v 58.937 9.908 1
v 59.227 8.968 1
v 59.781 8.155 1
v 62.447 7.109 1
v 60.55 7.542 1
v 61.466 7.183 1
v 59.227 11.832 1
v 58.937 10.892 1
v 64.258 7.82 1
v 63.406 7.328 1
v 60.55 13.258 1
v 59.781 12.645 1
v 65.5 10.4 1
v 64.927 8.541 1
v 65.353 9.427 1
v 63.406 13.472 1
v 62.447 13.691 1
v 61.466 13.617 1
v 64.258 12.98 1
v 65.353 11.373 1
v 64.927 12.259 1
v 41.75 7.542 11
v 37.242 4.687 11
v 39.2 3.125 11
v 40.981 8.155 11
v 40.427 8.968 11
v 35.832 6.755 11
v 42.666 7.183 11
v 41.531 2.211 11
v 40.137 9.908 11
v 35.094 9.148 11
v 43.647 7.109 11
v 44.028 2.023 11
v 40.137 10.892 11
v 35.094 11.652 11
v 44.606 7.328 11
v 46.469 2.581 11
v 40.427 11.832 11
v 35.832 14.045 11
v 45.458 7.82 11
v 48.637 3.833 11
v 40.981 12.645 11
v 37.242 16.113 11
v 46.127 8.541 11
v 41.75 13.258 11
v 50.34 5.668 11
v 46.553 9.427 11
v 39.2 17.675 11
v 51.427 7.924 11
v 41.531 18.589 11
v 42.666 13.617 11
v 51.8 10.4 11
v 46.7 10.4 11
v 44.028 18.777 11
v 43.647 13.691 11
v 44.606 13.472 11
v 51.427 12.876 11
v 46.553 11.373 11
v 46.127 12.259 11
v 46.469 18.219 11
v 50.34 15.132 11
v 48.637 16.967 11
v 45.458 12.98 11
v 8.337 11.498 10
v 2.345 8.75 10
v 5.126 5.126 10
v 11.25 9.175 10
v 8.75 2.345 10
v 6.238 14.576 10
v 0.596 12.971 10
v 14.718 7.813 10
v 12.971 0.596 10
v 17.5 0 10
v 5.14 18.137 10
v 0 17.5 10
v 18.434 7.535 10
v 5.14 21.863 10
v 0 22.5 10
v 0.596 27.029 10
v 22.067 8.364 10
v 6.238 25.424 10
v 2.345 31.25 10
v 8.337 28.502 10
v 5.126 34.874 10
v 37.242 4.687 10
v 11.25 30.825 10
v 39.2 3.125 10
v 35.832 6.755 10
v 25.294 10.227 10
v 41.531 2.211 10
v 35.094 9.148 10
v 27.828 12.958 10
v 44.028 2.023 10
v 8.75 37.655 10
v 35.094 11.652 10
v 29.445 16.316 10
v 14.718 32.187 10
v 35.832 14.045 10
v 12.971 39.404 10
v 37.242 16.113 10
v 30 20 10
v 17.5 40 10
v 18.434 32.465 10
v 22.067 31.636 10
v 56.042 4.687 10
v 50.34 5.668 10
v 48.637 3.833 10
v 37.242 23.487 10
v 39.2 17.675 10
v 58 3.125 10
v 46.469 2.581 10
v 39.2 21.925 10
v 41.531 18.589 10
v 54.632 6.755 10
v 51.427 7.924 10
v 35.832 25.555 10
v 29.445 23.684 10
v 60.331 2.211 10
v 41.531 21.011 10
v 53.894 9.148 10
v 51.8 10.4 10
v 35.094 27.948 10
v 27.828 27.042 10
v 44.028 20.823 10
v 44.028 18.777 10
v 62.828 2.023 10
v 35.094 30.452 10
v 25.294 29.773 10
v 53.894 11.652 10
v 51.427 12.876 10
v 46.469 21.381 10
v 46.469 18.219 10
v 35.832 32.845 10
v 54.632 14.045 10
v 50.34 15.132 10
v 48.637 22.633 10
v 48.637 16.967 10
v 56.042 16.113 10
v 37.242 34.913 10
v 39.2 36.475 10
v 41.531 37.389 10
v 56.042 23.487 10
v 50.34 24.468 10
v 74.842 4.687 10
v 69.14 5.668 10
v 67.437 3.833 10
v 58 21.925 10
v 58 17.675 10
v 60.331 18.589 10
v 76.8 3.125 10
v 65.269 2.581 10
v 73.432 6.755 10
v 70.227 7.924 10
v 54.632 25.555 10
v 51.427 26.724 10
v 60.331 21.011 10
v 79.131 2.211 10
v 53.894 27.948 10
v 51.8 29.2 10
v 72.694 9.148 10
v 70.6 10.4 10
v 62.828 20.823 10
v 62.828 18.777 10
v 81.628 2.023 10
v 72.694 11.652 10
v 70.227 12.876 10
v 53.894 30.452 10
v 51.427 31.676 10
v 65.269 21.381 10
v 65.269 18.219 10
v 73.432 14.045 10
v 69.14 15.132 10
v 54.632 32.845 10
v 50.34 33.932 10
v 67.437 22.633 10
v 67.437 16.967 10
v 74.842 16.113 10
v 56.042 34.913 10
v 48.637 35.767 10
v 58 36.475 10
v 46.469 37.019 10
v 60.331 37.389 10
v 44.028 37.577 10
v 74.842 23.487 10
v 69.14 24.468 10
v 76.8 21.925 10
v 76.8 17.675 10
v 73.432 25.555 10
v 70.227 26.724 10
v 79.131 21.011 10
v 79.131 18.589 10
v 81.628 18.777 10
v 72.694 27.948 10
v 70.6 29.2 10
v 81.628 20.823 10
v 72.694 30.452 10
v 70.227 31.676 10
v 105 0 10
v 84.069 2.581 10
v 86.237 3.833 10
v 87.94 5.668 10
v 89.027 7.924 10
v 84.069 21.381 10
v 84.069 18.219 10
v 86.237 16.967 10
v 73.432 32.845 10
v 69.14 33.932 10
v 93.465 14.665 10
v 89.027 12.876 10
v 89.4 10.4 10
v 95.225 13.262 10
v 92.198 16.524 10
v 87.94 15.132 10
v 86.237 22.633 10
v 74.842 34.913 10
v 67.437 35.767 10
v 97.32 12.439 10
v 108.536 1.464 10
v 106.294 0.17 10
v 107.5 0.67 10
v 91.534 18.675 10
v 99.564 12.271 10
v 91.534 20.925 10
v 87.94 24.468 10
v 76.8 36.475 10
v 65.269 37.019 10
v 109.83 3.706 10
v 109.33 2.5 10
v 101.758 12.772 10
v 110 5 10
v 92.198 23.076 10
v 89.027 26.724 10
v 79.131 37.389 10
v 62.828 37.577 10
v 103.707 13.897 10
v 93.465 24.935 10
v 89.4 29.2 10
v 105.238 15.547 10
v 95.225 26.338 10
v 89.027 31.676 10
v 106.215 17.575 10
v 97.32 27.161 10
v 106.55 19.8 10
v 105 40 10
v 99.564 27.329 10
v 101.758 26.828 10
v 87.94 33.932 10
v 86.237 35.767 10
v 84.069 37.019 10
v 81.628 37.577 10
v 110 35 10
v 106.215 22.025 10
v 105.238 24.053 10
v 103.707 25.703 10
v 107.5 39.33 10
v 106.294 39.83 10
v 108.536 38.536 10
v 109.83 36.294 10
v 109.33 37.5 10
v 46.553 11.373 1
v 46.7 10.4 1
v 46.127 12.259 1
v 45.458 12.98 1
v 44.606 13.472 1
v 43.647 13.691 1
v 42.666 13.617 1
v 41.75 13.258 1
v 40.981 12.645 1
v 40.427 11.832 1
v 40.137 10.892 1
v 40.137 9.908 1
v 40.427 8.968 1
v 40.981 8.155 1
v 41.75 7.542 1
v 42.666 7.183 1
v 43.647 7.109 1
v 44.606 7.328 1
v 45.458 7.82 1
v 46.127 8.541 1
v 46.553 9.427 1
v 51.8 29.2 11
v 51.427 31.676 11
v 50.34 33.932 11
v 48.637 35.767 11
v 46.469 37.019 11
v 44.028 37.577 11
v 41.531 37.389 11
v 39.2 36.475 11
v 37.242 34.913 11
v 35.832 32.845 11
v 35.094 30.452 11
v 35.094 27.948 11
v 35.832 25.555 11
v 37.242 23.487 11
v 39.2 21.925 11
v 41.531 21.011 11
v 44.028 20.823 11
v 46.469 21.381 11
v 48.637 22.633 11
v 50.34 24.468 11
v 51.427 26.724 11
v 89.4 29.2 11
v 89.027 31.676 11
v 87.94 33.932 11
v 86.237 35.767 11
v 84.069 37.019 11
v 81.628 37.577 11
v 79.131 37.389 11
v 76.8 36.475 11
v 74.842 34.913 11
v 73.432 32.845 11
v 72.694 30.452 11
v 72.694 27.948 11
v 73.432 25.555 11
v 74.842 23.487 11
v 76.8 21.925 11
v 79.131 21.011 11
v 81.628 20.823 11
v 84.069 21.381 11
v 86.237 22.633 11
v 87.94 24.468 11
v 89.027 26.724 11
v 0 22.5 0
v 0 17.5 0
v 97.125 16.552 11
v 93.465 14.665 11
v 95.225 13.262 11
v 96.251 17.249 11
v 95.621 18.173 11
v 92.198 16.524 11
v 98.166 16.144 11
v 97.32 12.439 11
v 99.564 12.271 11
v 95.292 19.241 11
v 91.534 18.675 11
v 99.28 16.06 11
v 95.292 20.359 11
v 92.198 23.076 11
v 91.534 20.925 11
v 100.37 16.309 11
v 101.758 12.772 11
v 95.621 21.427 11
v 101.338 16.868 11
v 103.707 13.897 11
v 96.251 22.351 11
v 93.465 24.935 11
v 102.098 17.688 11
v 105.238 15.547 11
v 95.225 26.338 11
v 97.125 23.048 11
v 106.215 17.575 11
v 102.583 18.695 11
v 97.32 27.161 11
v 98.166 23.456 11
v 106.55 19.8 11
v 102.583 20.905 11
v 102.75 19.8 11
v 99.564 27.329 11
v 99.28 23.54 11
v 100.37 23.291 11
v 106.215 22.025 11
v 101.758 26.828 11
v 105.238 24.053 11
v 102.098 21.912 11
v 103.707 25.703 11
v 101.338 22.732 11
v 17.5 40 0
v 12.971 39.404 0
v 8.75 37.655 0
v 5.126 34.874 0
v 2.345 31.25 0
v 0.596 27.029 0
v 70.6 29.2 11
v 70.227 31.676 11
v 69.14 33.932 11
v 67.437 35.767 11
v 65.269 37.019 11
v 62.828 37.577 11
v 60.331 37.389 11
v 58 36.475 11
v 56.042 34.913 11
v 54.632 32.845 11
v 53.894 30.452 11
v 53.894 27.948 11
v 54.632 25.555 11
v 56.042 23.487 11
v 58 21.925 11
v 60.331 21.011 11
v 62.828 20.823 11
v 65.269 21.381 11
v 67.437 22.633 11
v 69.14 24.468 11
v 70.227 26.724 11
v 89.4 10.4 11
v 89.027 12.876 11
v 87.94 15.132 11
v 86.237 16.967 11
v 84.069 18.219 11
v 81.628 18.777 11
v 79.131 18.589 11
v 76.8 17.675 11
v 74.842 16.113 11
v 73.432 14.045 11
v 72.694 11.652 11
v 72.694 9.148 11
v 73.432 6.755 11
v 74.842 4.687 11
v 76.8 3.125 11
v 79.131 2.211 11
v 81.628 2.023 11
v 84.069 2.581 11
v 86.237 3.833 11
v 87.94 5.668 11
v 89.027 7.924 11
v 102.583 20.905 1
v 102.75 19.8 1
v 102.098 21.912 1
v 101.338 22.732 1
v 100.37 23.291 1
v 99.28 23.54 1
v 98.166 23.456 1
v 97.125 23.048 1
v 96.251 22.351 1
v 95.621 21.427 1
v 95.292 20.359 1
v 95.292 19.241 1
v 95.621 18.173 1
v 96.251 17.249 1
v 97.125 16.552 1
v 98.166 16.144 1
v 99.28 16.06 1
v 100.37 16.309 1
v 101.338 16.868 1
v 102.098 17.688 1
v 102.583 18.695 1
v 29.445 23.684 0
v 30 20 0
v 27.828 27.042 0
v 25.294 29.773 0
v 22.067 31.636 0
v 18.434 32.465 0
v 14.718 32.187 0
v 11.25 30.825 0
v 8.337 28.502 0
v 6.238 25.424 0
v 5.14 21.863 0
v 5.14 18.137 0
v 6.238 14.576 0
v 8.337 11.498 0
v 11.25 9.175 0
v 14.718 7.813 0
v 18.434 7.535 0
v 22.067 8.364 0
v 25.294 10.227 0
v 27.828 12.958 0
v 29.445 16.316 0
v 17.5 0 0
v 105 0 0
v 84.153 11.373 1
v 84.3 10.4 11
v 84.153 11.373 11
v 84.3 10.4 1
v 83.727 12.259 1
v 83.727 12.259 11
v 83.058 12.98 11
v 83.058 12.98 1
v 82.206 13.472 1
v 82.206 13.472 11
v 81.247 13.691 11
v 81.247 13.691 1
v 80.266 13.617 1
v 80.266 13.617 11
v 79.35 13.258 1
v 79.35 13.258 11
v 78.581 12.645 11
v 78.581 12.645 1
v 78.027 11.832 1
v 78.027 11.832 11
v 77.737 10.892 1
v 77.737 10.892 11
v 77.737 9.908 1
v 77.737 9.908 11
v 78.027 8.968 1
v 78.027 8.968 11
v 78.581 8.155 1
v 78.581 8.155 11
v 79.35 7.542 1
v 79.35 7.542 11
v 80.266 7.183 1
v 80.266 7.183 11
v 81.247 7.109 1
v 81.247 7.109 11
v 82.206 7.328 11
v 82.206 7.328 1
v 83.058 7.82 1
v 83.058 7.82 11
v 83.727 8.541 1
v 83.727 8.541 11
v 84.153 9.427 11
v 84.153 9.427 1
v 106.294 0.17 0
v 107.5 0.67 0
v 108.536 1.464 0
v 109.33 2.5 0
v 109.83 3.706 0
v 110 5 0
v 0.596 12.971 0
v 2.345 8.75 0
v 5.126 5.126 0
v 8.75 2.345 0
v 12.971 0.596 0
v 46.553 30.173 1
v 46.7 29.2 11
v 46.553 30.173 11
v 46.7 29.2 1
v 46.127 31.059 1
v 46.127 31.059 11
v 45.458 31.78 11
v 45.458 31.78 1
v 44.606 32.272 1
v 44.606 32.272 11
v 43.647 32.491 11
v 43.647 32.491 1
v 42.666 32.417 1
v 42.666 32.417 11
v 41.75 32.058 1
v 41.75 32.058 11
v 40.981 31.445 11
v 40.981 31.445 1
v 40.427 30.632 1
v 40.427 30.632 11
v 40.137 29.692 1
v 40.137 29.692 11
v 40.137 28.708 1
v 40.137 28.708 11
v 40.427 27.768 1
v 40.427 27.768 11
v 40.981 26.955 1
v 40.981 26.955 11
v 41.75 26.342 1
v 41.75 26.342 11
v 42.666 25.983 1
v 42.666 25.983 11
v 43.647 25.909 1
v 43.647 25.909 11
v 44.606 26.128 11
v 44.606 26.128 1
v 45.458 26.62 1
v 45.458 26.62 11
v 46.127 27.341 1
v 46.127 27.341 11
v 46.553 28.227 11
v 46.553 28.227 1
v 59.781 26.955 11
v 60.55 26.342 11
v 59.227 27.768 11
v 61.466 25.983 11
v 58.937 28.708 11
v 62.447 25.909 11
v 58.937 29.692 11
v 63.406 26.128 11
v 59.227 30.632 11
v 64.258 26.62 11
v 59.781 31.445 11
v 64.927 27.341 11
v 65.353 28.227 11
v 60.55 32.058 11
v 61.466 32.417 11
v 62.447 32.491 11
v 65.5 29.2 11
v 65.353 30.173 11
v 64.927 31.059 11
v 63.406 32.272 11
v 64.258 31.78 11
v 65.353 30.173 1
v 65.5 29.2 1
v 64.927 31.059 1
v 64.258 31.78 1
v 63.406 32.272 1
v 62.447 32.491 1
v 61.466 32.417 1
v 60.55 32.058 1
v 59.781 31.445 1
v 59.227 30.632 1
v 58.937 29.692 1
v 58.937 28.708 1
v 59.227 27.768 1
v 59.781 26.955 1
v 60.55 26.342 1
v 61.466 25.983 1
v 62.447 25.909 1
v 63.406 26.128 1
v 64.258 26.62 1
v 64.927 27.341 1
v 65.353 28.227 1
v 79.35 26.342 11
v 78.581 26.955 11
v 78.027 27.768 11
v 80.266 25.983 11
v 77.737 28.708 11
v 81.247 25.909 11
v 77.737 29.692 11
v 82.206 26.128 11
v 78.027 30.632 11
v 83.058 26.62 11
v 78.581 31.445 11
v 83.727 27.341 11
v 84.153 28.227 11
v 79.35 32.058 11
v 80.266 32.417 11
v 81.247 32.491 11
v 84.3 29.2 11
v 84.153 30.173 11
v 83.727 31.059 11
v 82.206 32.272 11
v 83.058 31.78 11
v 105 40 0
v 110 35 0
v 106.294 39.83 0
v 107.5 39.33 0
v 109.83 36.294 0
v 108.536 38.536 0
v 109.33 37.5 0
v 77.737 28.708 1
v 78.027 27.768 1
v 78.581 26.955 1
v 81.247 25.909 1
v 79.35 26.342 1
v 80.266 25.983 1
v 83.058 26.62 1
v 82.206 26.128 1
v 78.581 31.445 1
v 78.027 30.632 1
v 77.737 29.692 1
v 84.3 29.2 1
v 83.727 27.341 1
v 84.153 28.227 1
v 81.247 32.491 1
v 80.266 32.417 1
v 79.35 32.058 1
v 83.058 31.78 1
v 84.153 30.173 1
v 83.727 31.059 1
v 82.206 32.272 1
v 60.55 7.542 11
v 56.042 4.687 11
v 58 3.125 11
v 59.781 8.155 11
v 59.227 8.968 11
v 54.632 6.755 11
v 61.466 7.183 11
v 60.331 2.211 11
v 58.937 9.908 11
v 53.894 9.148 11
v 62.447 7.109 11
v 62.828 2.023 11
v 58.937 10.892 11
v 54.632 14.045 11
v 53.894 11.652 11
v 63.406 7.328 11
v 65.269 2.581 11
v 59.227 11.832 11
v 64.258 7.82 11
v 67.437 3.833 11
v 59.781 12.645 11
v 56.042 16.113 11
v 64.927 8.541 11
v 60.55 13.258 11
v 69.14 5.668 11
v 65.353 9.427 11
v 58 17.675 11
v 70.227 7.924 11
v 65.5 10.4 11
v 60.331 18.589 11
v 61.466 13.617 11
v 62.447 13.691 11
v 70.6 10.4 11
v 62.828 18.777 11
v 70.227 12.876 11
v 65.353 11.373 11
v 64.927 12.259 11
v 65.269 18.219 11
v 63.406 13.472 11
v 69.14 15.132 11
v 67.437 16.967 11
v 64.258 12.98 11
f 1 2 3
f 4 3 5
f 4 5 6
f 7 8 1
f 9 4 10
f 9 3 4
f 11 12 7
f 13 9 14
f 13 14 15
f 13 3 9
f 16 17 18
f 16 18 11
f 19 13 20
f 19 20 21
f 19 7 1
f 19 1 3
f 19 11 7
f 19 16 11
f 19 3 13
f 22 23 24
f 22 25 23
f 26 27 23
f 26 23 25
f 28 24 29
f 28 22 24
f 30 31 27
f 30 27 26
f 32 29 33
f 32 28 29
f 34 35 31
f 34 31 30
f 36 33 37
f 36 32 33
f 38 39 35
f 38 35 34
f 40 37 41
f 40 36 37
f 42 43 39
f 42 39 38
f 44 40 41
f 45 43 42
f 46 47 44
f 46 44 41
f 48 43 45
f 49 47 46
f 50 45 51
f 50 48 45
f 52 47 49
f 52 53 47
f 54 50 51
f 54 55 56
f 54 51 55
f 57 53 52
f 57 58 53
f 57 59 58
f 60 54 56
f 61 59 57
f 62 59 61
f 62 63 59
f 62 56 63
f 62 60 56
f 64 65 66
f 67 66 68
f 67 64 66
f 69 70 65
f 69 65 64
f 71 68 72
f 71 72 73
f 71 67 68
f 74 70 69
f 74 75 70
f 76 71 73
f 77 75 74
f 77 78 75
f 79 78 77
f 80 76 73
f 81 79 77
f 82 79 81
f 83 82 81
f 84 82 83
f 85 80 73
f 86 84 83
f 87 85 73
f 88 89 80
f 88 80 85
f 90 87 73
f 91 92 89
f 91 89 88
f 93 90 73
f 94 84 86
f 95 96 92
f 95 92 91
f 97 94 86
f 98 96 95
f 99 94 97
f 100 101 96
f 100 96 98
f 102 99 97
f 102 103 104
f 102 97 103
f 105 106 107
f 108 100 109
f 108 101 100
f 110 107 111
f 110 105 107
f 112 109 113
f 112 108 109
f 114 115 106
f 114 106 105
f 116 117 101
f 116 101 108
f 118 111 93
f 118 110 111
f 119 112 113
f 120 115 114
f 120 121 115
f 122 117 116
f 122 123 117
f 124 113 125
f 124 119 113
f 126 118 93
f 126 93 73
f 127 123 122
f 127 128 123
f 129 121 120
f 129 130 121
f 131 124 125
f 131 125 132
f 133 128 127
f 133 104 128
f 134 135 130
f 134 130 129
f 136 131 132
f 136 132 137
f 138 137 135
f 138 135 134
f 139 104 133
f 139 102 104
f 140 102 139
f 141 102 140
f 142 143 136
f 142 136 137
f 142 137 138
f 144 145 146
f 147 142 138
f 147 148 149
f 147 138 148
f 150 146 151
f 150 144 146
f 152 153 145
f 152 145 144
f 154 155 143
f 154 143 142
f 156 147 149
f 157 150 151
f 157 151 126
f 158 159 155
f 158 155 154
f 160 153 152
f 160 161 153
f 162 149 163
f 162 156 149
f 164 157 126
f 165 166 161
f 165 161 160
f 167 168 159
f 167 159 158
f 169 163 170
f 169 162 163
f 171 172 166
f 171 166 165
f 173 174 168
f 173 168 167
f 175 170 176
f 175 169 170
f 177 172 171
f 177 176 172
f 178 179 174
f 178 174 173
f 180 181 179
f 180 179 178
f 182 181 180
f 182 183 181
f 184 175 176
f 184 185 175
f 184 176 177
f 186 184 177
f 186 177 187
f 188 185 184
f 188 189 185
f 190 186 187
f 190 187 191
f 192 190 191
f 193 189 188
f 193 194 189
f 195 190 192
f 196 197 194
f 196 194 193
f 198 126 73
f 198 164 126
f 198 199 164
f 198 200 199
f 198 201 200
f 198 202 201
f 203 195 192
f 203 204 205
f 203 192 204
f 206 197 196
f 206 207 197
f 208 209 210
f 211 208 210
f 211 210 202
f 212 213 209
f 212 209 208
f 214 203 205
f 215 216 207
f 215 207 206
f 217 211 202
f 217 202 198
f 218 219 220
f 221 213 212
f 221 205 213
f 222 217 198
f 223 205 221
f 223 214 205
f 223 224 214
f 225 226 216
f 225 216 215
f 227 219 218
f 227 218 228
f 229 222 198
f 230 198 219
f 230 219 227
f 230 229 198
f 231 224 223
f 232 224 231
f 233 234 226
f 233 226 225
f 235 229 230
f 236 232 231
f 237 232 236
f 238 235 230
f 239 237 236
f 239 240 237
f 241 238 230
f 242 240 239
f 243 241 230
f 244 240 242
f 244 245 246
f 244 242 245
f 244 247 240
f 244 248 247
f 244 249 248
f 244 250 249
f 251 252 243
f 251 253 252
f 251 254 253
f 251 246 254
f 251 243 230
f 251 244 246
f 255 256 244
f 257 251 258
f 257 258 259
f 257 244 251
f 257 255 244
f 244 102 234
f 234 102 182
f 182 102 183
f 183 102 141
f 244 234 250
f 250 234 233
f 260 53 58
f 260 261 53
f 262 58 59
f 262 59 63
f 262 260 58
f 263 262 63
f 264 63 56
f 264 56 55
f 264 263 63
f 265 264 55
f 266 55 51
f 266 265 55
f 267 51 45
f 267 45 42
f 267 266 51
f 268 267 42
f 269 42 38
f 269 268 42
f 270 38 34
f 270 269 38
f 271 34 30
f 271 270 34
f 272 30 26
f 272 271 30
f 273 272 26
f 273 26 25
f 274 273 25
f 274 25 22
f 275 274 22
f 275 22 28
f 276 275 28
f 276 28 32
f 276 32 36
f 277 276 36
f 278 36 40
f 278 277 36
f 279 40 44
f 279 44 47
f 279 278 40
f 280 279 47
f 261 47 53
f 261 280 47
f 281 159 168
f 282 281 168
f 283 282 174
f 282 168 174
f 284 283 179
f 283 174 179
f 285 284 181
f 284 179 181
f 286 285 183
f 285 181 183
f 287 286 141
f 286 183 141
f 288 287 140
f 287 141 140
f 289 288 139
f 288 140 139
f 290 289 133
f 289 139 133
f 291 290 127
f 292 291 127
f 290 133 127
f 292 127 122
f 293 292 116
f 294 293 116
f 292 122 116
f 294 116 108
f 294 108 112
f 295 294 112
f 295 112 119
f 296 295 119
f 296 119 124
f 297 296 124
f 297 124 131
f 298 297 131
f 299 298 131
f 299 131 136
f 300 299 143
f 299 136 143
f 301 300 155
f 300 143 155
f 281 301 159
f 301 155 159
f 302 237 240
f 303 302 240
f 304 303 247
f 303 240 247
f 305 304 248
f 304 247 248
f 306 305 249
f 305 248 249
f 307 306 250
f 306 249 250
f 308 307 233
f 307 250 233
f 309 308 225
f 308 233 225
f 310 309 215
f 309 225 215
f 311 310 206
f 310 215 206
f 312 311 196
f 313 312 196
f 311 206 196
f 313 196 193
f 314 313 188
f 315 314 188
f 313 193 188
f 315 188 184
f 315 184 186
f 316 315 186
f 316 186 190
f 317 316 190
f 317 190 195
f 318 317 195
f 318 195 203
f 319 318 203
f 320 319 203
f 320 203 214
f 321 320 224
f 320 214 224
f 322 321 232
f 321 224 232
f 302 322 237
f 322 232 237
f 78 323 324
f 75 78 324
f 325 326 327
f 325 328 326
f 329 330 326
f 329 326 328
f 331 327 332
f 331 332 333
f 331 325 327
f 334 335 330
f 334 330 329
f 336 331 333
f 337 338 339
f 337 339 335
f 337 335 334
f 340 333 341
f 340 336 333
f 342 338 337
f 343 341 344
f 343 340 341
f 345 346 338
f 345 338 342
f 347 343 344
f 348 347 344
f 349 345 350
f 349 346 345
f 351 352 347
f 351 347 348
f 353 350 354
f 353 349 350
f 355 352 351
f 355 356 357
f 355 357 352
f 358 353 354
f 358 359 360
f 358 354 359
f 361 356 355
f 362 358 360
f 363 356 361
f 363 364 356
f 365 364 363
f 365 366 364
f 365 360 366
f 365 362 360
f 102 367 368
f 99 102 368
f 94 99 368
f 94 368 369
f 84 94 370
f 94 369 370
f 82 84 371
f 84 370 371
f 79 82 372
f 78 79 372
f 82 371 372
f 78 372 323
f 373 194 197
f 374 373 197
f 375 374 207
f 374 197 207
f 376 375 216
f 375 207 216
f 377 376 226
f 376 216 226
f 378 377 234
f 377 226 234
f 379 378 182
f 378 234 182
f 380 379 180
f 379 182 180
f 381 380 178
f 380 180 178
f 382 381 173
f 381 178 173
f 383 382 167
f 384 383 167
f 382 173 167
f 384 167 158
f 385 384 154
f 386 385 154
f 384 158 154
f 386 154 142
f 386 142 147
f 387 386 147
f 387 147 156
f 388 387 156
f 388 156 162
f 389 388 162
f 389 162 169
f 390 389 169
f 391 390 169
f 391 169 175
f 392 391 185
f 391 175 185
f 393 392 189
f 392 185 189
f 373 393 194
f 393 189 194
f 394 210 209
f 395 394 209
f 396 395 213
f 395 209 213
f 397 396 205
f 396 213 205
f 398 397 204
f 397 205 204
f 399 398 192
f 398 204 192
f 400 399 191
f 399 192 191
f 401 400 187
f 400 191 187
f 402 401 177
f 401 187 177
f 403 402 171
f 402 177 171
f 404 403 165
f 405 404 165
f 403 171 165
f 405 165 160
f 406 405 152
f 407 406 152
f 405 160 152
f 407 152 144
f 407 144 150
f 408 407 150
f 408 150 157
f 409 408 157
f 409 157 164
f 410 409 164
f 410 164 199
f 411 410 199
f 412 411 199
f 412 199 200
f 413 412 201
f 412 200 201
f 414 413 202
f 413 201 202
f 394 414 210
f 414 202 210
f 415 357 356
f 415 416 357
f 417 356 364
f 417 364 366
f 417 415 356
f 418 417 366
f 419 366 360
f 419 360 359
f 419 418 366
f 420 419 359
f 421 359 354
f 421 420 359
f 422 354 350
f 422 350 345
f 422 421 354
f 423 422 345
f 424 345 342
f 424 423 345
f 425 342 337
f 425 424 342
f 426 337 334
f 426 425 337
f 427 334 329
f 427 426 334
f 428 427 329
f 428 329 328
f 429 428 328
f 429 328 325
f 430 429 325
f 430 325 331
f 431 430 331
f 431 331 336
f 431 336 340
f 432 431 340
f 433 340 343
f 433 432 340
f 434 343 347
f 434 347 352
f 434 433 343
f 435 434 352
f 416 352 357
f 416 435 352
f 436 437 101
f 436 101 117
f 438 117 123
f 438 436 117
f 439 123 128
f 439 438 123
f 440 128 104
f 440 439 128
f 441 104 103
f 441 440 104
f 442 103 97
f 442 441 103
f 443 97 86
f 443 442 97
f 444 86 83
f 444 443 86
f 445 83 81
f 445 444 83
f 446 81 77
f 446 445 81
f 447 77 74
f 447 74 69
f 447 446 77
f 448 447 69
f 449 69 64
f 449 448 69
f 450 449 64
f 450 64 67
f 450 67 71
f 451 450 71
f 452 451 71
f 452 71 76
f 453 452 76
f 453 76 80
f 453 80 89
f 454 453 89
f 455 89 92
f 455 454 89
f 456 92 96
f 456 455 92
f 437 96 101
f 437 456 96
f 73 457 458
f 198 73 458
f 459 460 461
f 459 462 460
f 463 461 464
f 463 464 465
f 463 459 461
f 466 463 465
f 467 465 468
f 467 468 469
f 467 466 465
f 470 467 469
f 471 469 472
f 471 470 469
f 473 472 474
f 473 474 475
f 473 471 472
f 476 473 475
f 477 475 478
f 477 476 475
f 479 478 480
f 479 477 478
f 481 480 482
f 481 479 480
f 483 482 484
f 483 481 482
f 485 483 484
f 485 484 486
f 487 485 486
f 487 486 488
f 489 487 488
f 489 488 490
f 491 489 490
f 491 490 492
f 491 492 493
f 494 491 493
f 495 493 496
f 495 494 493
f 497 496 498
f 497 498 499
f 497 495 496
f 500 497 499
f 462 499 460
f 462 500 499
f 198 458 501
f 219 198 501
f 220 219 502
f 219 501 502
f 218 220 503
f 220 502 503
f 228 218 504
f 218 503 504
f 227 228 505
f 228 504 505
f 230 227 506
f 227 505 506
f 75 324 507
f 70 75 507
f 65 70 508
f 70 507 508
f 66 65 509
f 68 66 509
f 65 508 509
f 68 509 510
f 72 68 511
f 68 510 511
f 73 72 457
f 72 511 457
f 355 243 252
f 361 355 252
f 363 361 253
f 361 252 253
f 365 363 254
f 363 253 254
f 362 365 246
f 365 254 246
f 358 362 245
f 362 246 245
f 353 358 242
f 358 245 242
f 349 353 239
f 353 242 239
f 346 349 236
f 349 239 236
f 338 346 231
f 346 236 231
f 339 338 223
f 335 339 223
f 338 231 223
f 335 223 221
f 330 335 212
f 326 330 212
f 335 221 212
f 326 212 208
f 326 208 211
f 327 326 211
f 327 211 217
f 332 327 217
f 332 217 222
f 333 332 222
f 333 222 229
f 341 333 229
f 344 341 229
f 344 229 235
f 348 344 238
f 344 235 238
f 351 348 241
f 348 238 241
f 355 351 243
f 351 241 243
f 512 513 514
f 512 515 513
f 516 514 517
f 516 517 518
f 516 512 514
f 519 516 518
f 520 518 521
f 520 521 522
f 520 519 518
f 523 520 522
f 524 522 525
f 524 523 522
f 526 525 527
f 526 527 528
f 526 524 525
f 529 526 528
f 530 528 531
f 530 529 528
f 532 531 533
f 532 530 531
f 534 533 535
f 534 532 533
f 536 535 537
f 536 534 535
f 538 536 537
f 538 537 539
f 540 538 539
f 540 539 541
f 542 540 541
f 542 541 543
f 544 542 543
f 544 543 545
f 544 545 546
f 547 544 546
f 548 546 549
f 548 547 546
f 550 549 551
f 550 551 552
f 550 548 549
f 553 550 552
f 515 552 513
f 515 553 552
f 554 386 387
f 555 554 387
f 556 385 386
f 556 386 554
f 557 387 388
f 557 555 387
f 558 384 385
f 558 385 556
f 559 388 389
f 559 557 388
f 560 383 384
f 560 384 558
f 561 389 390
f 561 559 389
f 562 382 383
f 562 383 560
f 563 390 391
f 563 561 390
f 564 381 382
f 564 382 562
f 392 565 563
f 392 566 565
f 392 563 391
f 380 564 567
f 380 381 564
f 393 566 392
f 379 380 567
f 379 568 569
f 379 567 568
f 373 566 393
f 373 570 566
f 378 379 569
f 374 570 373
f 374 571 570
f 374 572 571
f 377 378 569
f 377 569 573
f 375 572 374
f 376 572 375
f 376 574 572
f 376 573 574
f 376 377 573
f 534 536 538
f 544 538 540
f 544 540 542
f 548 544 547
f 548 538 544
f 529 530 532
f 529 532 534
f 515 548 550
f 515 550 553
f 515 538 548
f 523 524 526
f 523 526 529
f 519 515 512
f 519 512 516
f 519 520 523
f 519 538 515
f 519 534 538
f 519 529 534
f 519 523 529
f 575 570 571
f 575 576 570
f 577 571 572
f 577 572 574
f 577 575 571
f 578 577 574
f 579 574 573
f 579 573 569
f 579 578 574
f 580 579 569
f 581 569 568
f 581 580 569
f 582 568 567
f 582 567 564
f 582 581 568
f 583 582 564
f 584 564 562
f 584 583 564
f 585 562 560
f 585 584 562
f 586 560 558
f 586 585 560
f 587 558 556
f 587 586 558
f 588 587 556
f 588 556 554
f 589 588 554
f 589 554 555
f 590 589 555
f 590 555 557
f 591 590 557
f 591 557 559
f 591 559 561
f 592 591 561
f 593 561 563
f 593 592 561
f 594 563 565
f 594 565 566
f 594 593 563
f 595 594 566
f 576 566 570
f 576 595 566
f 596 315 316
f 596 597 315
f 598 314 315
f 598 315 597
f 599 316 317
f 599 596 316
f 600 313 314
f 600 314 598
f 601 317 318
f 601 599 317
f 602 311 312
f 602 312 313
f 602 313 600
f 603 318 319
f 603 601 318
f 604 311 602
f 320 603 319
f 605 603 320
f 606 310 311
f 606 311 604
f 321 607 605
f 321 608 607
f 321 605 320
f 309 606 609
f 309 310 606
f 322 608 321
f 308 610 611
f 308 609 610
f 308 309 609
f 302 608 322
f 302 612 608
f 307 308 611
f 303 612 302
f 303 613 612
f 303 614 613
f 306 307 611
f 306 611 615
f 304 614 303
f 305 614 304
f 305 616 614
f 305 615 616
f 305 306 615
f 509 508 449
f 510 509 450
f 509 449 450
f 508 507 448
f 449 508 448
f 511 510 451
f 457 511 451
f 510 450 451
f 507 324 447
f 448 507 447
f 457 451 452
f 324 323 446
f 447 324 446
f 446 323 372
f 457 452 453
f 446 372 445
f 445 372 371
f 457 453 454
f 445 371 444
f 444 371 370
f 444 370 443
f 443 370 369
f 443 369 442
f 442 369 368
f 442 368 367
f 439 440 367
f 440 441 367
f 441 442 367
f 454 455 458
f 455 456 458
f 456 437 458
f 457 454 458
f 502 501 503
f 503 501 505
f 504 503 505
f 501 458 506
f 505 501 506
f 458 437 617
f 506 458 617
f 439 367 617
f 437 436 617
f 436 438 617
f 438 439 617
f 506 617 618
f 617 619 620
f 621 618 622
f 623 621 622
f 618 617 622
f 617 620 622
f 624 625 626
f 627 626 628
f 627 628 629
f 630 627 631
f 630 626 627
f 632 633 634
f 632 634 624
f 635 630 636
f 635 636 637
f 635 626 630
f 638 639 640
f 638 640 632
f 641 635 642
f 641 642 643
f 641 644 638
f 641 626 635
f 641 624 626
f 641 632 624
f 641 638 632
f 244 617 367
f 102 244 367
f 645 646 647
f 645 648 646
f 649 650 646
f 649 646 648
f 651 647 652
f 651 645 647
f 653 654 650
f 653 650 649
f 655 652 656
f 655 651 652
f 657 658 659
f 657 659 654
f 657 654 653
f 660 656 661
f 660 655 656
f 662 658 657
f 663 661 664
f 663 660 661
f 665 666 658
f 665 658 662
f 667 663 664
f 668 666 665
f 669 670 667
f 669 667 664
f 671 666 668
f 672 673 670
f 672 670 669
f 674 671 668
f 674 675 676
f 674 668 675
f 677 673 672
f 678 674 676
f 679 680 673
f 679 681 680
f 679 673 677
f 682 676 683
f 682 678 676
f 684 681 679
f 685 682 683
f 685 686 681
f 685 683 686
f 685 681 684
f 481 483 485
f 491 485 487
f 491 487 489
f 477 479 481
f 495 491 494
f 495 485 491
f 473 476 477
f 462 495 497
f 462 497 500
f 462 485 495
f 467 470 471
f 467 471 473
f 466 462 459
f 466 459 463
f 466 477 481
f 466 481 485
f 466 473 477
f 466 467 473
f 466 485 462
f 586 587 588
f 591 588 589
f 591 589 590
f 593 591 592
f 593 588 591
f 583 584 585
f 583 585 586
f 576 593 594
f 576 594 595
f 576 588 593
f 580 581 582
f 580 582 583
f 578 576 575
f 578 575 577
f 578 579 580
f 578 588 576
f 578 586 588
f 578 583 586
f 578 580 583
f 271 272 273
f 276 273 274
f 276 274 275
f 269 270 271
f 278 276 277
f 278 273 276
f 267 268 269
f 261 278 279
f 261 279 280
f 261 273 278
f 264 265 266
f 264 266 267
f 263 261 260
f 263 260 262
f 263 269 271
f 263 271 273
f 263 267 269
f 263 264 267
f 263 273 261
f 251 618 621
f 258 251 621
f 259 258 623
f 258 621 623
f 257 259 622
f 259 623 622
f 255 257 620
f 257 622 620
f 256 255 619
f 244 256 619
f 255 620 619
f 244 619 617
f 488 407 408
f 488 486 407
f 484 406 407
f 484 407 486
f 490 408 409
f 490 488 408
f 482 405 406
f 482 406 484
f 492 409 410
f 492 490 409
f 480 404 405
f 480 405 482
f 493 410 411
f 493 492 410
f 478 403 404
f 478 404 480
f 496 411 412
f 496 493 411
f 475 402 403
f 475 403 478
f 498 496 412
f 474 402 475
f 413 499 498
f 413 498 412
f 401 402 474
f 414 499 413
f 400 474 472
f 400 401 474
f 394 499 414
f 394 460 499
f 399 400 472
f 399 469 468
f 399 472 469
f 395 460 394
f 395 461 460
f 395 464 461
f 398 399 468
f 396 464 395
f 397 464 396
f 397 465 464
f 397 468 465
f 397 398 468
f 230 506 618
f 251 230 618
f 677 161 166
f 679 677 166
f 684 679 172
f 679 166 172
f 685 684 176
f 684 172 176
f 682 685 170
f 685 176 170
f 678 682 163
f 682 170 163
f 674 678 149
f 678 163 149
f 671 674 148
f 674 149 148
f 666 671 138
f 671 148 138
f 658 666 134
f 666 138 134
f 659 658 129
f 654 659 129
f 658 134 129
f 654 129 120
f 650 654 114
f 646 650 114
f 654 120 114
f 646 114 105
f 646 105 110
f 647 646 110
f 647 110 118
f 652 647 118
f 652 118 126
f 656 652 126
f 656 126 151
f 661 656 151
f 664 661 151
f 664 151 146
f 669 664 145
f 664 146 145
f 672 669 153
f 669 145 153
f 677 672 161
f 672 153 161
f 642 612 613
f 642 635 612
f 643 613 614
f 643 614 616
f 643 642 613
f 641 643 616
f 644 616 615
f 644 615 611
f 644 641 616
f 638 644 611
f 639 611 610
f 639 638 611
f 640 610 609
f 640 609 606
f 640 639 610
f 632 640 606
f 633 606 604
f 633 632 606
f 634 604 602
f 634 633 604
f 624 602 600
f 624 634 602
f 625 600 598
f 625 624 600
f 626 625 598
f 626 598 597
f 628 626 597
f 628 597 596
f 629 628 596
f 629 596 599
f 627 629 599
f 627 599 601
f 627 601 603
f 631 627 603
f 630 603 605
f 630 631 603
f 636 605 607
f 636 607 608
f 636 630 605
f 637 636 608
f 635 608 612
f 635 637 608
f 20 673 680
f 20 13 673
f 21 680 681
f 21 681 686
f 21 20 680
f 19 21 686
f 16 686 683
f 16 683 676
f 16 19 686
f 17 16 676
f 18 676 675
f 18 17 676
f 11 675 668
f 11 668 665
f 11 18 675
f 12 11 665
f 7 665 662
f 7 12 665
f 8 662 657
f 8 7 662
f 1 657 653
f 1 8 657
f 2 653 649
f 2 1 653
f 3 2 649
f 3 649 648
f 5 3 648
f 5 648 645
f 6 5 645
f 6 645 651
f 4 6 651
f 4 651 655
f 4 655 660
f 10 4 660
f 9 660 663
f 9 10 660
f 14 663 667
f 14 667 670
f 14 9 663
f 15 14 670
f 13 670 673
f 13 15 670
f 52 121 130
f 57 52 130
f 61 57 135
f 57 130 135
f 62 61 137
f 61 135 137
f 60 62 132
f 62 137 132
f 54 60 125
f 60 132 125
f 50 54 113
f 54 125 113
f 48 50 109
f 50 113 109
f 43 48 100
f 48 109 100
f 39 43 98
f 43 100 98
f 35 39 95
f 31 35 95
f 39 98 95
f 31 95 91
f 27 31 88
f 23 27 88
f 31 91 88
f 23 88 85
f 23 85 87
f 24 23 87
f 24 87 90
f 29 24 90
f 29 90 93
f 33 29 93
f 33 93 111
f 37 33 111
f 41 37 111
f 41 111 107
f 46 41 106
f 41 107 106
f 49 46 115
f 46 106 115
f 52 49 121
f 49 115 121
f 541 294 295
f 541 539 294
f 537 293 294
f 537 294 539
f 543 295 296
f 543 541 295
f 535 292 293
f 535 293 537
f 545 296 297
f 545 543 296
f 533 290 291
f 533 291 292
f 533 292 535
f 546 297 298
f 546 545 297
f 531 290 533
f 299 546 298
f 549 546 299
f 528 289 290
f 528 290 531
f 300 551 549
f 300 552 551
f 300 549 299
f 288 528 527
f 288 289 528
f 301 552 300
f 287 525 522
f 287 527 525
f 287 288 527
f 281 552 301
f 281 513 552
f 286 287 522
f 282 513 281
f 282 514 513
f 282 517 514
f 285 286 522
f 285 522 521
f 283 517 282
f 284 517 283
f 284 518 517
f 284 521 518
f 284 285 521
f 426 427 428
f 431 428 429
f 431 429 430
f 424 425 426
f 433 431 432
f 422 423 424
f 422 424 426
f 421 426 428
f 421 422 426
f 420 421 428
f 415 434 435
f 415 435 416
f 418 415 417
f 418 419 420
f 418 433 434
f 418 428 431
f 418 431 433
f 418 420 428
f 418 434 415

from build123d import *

# Parameters (mm, degrees)
F0_R     = 12.5
F1_DEPTH = 10
F2_R     = 8.4
F2_R_2   = 3.3
F2_R_3   = 7.55
F2_R_4   = 3.75
F3_DEPTH = 1
F4_DEPTH = 9


with BuildPart() as f1:
    # F0 (on Top) → F1 (new body)
    with BuildSketch(Plane.XY):
        with BuildLine():
            ThreePointArc((0, 17.5), (5.125631, 5.125631), (17.5, 0))
            Line((17.5, 0), (105, 0))
            ThreePointArc((105, 0), (108.535534, 1.464466), (110, 5))
            Line((110, 5), (110, 35))
            ThreePointArc((110, 35), (108.535534, 38.535534), (105, 40))
            Line((105, 40), (17.5, 40))
            ThreePointArc((17.5, 40), (5.125631, 34.874369), (0, 22.5))
            Line((0, 22.5), (0, 17.5))
        make_face()
        with Locations((17.5, 20)):
            Circle(F0_R, mode=Mode.SUBTRACT)
    extrude(amount=F1_DEPTH)

    # F2 (on face) → F3 (join)
    with BuildSketch(Plane.XY.offset(10)):
        with Locations((43.4, 29.2)):
            Circle(F2_R)
        with Locations((43.4, 29.2)):
            Circle(F2_R_2, mode=Mode.SUBTRACT)
        with Locations((62.2, 29.2)):
            Circle(F2_R)
        with Locations((62.2, 29.2)):
            Circle(F2_R_2, mode=Mode.SUBTRACT)
        with Locations((62.2, 10.4)):
            Circle(F2_R)
        with Locations((62.2, 10.4)):
            Circle(F2_R_2, mode=Mode.SUBTRACT)
        with Locations((43.4, 10.4)):
            Circle(F2_R)
        with Locations((43.4, 10.4)):
            Circle(F2_R_2, mode=Mode.SUBTRACT)
        with Locations((81, 10.4)):
            Circle(F2_R)
        with Locations((81, 10.4)):
            Circle(F2_R_2, mode=Mode.SUBTRACT)
        with Locations((81, 29.2)):
            Circle(F2_R)
        with Locations((81, 29.2)):
            Circle(F2_R_2, mode=Mode.SUBTRACT)
        with Locations((99, 19.8)):
            Circle(F2_R_3)
        with Locations((99, 19.8)):
            Circle(F2_R_4, mode=Mode.SUBTRACT)
    extrude(amount=F3_DEPTH)

    # F2 (on face) → F4 (cut)
    with BuildSketch(Plane.XY.offset(10)):
        with Locations((99, 19.8)):
            Circle(F2_R_4)
        with Locations((81, 29.2)):
            Circle(F2_R_2)
        with Locations((81, 10.4)):
            Circle(F2_R_2)
        with Locations((62.2, 10.4)):
            Circle(F2_R_2)
        with Locations((62.2, 29.2)):
            Circle(F2_R_2)
        with Locations((43.4, 29.2)):
            Circle(F2_R_2)
        with Locations((43.4, 10.4)):
            Circle(F2_R_2)
    extrude(amount=-F4_DEPTH, mode=Mode.SUBTRACT)


solid = f1.part
